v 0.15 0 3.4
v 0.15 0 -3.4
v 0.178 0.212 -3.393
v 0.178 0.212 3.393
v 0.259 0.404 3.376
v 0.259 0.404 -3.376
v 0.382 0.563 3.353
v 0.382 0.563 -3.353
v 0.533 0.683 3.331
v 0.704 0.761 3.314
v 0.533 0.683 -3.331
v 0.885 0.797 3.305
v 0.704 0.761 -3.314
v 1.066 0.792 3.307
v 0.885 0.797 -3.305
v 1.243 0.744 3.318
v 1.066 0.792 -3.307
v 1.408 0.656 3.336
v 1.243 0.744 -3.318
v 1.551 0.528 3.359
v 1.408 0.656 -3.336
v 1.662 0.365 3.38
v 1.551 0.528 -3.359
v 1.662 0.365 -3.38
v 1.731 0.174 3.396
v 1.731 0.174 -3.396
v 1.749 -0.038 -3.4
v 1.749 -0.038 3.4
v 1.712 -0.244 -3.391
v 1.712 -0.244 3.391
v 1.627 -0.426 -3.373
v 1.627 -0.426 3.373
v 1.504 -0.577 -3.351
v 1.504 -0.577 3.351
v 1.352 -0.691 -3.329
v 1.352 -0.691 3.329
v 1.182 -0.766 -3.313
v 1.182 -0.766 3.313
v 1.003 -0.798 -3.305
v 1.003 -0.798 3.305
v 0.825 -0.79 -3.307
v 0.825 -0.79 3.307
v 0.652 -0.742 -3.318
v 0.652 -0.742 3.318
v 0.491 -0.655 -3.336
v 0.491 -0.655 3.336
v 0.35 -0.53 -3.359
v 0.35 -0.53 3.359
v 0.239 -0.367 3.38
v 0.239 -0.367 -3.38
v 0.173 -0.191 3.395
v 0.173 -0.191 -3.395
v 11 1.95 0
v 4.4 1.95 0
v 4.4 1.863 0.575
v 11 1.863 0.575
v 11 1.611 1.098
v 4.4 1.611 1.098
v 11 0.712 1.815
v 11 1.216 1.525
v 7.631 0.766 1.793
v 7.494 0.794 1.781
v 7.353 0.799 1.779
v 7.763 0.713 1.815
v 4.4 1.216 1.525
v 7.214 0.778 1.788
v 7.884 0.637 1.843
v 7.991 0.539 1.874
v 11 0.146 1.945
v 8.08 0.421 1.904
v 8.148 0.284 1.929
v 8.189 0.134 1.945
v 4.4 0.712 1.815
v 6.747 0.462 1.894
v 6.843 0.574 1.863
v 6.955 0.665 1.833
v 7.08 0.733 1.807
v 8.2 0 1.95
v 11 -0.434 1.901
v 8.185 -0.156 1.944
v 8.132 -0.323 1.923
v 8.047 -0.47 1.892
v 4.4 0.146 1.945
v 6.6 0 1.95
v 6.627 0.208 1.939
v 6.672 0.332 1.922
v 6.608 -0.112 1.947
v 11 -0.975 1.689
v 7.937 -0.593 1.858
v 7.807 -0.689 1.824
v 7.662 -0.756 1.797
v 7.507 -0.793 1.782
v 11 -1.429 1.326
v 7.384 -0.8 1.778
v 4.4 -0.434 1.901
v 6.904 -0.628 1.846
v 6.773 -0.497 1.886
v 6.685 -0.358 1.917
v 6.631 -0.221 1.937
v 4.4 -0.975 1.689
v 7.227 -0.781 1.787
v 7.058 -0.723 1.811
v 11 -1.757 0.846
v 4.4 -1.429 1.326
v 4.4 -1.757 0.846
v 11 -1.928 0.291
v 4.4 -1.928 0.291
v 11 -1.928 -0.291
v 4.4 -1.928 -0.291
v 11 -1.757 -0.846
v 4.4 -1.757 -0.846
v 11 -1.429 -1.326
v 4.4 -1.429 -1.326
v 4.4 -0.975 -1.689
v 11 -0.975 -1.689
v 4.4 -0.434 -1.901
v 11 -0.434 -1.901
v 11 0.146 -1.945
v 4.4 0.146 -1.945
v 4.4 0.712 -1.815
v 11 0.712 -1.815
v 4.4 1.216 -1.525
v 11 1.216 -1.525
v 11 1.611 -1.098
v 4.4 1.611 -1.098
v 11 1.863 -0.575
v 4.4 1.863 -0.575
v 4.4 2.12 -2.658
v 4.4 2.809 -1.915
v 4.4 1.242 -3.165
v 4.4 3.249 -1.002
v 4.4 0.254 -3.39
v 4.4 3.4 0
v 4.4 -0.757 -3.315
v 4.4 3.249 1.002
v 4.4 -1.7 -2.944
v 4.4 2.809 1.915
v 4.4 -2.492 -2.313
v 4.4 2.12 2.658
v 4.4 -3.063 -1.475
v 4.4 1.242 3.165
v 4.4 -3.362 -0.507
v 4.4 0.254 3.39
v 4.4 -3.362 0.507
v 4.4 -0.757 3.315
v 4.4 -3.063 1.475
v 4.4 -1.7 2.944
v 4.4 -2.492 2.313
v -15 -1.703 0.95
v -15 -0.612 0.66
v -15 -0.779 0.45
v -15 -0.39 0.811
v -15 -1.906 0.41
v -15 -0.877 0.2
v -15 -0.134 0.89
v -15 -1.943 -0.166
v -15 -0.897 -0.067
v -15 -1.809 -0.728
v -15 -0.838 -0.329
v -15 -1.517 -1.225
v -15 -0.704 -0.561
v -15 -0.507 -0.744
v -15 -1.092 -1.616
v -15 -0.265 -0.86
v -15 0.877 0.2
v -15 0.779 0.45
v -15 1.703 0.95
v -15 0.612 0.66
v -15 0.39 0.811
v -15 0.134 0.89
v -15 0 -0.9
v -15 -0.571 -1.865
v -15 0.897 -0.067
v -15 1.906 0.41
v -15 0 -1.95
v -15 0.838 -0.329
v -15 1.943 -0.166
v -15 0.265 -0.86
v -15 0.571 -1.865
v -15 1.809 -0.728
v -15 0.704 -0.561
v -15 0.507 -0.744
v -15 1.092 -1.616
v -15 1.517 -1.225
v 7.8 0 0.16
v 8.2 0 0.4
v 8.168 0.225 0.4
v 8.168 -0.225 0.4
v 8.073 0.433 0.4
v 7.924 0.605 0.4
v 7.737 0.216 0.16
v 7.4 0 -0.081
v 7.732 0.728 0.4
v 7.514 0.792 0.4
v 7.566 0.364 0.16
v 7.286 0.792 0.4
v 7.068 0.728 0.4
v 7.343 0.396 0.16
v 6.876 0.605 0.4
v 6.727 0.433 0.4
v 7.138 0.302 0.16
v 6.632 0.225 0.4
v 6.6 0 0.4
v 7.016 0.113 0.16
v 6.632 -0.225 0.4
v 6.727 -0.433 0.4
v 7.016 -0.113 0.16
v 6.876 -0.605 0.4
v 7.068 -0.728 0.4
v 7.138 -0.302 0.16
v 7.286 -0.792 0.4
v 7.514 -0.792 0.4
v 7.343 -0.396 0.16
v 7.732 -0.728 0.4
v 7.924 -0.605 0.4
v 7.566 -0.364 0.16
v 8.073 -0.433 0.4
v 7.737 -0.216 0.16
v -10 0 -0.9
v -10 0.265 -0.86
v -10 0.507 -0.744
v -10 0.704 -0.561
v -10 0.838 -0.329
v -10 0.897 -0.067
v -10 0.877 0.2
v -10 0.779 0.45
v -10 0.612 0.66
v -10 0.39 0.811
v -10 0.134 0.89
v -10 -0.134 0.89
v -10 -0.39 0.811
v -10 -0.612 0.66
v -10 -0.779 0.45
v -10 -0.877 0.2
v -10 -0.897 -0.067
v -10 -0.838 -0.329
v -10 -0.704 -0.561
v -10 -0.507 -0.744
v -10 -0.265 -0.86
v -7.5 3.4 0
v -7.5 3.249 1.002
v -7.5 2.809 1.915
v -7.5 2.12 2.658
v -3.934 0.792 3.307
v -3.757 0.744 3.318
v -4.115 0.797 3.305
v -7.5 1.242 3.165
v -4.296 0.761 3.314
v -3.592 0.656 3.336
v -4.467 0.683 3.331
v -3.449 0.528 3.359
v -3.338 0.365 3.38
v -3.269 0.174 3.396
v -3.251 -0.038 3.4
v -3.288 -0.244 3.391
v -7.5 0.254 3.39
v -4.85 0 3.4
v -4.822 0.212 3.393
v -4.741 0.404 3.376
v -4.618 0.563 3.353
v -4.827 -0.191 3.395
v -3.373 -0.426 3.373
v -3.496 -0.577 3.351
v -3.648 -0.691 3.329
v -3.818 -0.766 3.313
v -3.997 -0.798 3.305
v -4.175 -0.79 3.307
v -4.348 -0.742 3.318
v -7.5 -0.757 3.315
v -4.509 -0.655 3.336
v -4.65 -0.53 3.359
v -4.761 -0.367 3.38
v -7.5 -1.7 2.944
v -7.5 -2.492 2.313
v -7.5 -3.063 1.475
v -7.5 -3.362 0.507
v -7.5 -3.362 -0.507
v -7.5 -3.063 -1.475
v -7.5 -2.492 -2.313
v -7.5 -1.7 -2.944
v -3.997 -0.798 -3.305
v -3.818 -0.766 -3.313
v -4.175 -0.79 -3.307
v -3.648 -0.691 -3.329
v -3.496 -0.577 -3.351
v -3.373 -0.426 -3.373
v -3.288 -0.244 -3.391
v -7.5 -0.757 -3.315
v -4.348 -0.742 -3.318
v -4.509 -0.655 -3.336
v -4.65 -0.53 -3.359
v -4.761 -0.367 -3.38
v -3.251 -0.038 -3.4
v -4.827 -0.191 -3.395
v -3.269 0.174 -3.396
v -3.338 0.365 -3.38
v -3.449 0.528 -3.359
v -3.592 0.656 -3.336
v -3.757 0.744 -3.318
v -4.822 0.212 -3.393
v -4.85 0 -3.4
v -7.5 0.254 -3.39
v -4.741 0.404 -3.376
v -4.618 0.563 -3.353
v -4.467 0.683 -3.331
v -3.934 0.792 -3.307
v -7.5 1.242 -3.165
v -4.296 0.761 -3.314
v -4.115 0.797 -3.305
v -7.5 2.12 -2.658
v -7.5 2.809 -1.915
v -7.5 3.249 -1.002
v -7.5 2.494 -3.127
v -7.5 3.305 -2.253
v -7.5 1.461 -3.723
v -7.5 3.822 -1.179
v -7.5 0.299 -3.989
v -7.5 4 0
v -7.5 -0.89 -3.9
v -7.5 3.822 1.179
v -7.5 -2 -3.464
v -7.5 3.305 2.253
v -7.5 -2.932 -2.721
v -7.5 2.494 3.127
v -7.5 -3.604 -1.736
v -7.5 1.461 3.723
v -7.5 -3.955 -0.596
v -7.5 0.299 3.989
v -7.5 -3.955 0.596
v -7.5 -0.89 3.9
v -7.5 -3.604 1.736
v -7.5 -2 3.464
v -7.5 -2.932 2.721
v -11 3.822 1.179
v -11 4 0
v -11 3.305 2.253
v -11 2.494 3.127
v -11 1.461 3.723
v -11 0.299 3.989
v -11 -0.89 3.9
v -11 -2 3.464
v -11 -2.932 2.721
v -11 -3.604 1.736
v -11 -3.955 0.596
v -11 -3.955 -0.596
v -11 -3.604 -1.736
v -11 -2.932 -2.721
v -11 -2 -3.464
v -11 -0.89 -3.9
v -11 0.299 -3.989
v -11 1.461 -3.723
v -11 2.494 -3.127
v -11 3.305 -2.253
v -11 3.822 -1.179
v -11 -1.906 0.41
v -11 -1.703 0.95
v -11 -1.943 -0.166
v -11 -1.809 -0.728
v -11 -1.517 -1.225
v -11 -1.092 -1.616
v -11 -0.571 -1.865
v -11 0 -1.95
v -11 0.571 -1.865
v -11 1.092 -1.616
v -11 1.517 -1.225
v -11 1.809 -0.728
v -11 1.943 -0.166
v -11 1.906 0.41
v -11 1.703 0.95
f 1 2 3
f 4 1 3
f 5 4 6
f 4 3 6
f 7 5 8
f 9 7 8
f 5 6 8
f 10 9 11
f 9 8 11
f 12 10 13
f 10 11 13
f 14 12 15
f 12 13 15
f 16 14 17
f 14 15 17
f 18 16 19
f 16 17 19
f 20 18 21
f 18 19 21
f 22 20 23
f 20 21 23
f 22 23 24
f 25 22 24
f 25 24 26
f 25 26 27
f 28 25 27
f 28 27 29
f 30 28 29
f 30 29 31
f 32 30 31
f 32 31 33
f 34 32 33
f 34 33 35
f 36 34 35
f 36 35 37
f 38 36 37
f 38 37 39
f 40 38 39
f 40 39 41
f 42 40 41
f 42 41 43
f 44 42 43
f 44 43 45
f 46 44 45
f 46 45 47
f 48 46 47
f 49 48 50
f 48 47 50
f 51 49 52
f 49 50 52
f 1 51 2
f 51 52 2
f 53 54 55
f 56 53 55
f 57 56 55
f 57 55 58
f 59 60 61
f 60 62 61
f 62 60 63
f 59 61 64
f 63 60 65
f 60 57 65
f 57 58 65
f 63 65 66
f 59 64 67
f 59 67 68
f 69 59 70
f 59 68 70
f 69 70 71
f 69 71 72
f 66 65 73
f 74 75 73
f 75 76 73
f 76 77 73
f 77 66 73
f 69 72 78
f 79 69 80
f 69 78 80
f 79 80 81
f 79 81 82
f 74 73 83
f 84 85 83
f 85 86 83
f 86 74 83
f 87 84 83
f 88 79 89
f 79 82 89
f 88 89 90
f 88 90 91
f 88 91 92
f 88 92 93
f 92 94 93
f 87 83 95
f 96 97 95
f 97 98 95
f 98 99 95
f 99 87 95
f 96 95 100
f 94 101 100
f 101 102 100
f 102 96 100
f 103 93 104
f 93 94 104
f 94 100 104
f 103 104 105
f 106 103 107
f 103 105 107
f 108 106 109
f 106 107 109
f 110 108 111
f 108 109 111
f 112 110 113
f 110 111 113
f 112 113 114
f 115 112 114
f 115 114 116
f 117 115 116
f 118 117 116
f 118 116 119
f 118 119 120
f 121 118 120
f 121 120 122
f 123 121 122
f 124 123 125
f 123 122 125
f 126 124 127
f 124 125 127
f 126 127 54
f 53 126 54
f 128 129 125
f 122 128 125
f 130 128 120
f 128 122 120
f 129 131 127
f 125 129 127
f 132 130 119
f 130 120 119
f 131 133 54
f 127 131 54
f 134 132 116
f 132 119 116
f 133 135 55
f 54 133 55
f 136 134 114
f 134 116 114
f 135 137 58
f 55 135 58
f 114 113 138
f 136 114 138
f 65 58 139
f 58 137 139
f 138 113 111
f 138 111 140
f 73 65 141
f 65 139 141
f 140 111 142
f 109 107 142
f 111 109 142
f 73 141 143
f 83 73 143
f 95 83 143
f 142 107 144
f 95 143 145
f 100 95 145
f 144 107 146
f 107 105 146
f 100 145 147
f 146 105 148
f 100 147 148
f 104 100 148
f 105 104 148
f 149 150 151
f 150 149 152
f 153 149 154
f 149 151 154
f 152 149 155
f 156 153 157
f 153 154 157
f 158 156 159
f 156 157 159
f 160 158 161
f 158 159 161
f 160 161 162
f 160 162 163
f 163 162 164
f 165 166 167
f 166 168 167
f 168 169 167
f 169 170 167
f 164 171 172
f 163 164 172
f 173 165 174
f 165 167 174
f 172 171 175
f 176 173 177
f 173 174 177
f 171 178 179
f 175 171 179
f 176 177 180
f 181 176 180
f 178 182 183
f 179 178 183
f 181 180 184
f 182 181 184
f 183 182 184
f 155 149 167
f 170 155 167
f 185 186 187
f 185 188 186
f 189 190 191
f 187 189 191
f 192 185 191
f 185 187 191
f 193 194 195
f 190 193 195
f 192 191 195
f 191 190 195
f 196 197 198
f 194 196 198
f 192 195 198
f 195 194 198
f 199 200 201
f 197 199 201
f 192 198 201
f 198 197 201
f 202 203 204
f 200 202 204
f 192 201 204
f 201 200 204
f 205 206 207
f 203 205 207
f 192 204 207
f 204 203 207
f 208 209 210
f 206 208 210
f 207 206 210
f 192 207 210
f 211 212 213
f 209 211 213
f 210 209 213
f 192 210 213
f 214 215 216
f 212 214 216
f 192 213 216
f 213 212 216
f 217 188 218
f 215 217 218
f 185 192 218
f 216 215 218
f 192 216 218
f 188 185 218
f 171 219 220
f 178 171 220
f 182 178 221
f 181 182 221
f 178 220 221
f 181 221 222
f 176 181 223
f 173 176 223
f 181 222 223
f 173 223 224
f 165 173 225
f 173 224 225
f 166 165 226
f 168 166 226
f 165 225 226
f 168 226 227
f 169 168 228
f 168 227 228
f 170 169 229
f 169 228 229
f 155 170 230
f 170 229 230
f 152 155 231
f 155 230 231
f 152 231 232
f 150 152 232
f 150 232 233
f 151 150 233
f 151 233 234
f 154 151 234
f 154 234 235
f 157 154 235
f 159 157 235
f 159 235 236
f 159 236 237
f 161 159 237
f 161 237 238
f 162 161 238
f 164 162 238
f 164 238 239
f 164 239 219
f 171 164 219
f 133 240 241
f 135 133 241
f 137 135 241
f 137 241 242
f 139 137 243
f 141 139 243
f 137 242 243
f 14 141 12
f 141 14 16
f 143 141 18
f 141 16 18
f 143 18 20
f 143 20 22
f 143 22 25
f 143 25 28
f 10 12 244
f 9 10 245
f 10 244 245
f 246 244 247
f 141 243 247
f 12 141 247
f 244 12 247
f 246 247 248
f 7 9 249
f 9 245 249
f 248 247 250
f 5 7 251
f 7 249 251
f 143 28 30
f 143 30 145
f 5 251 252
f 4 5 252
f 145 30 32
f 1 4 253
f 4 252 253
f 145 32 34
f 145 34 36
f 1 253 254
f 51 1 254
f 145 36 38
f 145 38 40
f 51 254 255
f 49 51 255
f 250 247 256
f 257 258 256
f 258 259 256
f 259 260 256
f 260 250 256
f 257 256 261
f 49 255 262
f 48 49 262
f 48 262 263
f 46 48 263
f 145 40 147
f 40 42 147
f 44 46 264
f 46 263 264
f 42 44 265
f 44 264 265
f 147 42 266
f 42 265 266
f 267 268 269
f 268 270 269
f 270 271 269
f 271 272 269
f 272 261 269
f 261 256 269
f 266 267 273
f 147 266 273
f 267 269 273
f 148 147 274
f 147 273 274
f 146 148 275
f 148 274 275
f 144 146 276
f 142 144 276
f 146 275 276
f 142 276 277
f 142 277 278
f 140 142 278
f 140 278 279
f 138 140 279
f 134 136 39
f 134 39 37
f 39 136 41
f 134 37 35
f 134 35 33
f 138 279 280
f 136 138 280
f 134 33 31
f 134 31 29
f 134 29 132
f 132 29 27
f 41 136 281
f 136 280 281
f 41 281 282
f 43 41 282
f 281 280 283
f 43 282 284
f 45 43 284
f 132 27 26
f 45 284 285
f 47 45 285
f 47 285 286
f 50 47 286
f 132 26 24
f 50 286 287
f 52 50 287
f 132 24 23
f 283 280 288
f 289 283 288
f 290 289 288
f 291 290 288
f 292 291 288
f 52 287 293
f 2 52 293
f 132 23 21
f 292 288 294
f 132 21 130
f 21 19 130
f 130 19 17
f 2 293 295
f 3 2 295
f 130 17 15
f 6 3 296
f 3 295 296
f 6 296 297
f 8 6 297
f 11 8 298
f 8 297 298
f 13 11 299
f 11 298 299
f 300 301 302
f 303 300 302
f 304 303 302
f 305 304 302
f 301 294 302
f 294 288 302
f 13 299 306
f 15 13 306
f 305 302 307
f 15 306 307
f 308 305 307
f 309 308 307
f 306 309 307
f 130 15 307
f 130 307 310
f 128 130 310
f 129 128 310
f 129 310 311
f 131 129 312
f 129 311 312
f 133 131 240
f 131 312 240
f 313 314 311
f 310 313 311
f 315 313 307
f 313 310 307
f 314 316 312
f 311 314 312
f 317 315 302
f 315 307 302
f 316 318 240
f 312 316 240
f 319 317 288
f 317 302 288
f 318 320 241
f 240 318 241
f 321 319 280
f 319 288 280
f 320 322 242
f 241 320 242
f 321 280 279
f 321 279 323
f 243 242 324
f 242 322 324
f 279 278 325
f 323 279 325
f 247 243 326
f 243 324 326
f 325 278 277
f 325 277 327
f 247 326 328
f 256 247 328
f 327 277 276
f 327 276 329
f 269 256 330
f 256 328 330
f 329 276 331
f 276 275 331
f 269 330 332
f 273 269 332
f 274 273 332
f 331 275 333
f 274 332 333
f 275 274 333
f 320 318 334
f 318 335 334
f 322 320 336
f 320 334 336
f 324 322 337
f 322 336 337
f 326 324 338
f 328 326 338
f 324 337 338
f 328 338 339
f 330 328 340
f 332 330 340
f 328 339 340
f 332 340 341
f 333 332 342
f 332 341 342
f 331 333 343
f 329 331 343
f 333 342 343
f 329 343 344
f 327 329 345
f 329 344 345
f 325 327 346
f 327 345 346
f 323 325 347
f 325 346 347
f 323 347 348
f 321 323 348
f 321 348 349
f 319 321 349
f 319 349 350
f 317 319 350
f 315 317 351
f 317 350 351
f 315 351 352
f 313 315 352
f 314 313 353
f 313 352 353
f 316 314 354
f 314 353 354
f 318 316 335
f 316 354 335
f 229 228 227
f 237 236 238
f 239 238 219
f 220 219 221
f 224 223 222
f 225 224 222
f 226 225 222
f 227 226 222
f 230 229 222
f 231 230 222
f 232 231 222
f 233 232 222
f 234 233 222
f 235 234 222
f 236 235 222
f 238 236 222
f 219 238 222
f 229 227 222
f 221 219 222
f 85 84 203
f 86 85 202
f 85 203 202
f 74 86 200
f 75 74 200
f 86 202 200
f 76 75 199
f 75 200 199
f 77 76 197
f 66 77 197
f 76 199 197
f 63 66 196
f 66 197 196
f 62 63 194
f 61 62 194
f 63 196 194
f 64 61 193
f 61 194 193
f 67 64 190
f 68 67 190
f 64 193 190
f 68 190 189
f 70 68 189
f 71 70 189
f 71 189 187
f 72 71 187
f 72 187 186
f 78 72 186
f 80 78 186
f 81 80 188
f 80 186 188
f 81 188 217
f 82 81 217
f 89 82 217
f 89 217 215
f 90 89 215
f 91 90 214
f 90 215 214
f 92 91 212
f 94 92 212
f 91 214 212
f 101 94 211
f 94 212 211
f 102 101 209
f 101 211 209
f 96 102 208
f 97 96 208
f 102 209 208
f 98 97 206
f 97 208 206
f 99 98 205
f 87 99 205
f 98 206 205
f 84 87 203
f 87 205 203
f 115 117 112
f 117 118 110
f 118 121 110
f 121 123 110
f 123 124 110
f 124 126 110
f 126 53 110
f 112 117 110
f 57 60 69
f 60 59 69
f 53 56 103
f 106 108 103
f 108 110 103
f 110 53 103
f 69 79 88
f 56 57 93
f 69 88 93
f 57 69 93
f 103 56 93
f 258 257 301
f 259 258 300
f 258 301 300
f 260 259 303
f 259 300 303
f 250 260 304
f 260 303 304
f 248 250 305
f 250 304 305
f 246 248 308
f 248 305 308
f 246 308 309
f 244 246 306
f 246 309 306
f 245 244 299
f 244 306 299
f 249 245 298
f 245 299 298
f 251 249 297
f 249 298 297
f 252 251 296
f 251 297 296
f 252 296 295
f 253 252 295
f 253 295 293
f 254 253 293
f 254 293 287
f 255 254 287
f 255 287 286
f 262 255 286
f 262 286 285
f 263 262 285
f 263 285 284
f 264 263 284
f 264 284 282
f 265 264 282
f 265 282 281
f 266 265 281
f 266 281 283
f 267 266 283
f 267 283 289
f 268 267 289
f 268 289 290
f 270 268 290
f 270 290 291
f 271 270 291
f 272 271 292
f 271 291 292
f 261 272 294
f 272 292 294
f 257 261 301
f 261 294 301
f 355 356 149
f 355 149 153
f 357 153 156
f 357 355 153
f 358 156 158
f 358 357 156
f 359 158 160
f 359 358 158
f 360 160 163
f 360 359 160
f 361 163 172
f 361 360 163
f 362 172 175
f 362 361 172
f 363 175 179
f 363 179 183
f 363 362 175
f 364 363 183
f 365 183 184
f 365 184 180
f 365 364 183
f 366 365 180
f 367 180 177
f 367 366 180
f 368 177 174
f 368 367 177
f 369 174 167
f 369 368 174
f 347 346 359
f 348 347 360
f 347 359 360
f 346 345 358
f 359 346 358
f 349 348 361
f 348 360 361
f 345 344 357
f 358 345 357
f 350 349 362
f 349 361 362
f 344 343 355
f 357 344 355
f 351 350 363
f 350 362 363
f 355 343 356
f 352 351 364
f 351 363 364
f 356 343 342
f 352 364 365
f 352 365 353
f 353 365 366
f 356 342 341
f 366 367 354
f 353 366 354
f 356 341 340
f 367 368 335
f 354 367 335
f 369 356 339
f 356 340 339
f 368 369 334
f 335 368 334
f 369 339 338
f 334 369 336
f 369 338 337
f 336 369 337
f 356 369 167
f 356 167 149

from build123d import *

# Parameters (mm, degrees)
M2X0_4_TAPPED_HOLE1_D           = 1.6
BOSS_EXTRUDE1_DEPTH             = 4
M2X0_4_TAPPED_HOLE2_D           = 1.6
M2X0_4_TAPPED_HOLE2_DEPTH       = 3
M2X0_4_TAPPED_HOLE2_CSINK_D     = 2.05
M2X0_4_TAPPED_HOLE2_CSINK_ANGLE = 90
M2X0_4_TAPPED_HOLE2_TIP         = 0.480688495
HOLE5_D                         = 1.8
HOLE5_DEPTH                     = 5


with BuildPart() as part:
    # Sketch1 → Revolve1 (revolve)
    with BuildSketch(Plane.XY):
        Polygon((-11, 0), (11, 0), (11, 1.95), (4.4, 1.95), (4.4, 3.4), (-7.5, 3.4), (-7.5, 4), (-11, 4), align=None)
    revolve(axis=Axis((0, 0, 0), (1, 0, 0)))

    # M2x0.4 Tapped Hole1 (through all)
    with Locations(Plane.XY.offset(3.4)):
        with Locations((-4.05, 0), (0.95, 0)):
            Hole(M2X0_4_TAPPED_HOLE1_D / 2)

    # Sketch6 → Boss-Extrude1 (add)
    with BuildSketch(Plane.ZY.offset(11)):
        with BuildLine():
            Line((0.95, 1.702938637), (0.95, -1.702938637))
            ThreePointArc((0.95, -1.702938637), (-1.95, 0), (0.95, 1.702938637))
        make_face()
    extrude(amount=BOSS_EXTRUDE1_DEPTH)

    # M2x0.4 Tapped Hole2
    with Locations(Plane.XY.offset(3.4)):
        with Locations((7.4, 0)):
            CounterSinkHole(M2X0_4_TAPPED_HOLE2_D / 2, M2X0_4_TAPPED_HOLE2_CSINK_D / 2, depth=M2X0_4_TAPPED_HOLE2_DEPTH, counter_sink_angle=M2X0_4_TAPPED_HOLE2_CSINK_ANGLE)
            with Locations((0, 0, -(M2X0_4_TAPPED_HOLE2_DEPTH + M2X0_4_TAPPED_HOLE2_TIP / 2))):  # 118° drill point
                Cone(0, M2X0_4_TAPPED_HOLE2_D / 2, M2X0_4_TAPPED_HOLE2_TIP, mode=Mode.SUBTRACT)

    # Hole5
    with Locations(Plane.ZY.offset(15)):
        with Locations((0, 0)):
            Hole(HOLE5_D / 2, depth=HOLE5_DEPTH)


solid = part.part
